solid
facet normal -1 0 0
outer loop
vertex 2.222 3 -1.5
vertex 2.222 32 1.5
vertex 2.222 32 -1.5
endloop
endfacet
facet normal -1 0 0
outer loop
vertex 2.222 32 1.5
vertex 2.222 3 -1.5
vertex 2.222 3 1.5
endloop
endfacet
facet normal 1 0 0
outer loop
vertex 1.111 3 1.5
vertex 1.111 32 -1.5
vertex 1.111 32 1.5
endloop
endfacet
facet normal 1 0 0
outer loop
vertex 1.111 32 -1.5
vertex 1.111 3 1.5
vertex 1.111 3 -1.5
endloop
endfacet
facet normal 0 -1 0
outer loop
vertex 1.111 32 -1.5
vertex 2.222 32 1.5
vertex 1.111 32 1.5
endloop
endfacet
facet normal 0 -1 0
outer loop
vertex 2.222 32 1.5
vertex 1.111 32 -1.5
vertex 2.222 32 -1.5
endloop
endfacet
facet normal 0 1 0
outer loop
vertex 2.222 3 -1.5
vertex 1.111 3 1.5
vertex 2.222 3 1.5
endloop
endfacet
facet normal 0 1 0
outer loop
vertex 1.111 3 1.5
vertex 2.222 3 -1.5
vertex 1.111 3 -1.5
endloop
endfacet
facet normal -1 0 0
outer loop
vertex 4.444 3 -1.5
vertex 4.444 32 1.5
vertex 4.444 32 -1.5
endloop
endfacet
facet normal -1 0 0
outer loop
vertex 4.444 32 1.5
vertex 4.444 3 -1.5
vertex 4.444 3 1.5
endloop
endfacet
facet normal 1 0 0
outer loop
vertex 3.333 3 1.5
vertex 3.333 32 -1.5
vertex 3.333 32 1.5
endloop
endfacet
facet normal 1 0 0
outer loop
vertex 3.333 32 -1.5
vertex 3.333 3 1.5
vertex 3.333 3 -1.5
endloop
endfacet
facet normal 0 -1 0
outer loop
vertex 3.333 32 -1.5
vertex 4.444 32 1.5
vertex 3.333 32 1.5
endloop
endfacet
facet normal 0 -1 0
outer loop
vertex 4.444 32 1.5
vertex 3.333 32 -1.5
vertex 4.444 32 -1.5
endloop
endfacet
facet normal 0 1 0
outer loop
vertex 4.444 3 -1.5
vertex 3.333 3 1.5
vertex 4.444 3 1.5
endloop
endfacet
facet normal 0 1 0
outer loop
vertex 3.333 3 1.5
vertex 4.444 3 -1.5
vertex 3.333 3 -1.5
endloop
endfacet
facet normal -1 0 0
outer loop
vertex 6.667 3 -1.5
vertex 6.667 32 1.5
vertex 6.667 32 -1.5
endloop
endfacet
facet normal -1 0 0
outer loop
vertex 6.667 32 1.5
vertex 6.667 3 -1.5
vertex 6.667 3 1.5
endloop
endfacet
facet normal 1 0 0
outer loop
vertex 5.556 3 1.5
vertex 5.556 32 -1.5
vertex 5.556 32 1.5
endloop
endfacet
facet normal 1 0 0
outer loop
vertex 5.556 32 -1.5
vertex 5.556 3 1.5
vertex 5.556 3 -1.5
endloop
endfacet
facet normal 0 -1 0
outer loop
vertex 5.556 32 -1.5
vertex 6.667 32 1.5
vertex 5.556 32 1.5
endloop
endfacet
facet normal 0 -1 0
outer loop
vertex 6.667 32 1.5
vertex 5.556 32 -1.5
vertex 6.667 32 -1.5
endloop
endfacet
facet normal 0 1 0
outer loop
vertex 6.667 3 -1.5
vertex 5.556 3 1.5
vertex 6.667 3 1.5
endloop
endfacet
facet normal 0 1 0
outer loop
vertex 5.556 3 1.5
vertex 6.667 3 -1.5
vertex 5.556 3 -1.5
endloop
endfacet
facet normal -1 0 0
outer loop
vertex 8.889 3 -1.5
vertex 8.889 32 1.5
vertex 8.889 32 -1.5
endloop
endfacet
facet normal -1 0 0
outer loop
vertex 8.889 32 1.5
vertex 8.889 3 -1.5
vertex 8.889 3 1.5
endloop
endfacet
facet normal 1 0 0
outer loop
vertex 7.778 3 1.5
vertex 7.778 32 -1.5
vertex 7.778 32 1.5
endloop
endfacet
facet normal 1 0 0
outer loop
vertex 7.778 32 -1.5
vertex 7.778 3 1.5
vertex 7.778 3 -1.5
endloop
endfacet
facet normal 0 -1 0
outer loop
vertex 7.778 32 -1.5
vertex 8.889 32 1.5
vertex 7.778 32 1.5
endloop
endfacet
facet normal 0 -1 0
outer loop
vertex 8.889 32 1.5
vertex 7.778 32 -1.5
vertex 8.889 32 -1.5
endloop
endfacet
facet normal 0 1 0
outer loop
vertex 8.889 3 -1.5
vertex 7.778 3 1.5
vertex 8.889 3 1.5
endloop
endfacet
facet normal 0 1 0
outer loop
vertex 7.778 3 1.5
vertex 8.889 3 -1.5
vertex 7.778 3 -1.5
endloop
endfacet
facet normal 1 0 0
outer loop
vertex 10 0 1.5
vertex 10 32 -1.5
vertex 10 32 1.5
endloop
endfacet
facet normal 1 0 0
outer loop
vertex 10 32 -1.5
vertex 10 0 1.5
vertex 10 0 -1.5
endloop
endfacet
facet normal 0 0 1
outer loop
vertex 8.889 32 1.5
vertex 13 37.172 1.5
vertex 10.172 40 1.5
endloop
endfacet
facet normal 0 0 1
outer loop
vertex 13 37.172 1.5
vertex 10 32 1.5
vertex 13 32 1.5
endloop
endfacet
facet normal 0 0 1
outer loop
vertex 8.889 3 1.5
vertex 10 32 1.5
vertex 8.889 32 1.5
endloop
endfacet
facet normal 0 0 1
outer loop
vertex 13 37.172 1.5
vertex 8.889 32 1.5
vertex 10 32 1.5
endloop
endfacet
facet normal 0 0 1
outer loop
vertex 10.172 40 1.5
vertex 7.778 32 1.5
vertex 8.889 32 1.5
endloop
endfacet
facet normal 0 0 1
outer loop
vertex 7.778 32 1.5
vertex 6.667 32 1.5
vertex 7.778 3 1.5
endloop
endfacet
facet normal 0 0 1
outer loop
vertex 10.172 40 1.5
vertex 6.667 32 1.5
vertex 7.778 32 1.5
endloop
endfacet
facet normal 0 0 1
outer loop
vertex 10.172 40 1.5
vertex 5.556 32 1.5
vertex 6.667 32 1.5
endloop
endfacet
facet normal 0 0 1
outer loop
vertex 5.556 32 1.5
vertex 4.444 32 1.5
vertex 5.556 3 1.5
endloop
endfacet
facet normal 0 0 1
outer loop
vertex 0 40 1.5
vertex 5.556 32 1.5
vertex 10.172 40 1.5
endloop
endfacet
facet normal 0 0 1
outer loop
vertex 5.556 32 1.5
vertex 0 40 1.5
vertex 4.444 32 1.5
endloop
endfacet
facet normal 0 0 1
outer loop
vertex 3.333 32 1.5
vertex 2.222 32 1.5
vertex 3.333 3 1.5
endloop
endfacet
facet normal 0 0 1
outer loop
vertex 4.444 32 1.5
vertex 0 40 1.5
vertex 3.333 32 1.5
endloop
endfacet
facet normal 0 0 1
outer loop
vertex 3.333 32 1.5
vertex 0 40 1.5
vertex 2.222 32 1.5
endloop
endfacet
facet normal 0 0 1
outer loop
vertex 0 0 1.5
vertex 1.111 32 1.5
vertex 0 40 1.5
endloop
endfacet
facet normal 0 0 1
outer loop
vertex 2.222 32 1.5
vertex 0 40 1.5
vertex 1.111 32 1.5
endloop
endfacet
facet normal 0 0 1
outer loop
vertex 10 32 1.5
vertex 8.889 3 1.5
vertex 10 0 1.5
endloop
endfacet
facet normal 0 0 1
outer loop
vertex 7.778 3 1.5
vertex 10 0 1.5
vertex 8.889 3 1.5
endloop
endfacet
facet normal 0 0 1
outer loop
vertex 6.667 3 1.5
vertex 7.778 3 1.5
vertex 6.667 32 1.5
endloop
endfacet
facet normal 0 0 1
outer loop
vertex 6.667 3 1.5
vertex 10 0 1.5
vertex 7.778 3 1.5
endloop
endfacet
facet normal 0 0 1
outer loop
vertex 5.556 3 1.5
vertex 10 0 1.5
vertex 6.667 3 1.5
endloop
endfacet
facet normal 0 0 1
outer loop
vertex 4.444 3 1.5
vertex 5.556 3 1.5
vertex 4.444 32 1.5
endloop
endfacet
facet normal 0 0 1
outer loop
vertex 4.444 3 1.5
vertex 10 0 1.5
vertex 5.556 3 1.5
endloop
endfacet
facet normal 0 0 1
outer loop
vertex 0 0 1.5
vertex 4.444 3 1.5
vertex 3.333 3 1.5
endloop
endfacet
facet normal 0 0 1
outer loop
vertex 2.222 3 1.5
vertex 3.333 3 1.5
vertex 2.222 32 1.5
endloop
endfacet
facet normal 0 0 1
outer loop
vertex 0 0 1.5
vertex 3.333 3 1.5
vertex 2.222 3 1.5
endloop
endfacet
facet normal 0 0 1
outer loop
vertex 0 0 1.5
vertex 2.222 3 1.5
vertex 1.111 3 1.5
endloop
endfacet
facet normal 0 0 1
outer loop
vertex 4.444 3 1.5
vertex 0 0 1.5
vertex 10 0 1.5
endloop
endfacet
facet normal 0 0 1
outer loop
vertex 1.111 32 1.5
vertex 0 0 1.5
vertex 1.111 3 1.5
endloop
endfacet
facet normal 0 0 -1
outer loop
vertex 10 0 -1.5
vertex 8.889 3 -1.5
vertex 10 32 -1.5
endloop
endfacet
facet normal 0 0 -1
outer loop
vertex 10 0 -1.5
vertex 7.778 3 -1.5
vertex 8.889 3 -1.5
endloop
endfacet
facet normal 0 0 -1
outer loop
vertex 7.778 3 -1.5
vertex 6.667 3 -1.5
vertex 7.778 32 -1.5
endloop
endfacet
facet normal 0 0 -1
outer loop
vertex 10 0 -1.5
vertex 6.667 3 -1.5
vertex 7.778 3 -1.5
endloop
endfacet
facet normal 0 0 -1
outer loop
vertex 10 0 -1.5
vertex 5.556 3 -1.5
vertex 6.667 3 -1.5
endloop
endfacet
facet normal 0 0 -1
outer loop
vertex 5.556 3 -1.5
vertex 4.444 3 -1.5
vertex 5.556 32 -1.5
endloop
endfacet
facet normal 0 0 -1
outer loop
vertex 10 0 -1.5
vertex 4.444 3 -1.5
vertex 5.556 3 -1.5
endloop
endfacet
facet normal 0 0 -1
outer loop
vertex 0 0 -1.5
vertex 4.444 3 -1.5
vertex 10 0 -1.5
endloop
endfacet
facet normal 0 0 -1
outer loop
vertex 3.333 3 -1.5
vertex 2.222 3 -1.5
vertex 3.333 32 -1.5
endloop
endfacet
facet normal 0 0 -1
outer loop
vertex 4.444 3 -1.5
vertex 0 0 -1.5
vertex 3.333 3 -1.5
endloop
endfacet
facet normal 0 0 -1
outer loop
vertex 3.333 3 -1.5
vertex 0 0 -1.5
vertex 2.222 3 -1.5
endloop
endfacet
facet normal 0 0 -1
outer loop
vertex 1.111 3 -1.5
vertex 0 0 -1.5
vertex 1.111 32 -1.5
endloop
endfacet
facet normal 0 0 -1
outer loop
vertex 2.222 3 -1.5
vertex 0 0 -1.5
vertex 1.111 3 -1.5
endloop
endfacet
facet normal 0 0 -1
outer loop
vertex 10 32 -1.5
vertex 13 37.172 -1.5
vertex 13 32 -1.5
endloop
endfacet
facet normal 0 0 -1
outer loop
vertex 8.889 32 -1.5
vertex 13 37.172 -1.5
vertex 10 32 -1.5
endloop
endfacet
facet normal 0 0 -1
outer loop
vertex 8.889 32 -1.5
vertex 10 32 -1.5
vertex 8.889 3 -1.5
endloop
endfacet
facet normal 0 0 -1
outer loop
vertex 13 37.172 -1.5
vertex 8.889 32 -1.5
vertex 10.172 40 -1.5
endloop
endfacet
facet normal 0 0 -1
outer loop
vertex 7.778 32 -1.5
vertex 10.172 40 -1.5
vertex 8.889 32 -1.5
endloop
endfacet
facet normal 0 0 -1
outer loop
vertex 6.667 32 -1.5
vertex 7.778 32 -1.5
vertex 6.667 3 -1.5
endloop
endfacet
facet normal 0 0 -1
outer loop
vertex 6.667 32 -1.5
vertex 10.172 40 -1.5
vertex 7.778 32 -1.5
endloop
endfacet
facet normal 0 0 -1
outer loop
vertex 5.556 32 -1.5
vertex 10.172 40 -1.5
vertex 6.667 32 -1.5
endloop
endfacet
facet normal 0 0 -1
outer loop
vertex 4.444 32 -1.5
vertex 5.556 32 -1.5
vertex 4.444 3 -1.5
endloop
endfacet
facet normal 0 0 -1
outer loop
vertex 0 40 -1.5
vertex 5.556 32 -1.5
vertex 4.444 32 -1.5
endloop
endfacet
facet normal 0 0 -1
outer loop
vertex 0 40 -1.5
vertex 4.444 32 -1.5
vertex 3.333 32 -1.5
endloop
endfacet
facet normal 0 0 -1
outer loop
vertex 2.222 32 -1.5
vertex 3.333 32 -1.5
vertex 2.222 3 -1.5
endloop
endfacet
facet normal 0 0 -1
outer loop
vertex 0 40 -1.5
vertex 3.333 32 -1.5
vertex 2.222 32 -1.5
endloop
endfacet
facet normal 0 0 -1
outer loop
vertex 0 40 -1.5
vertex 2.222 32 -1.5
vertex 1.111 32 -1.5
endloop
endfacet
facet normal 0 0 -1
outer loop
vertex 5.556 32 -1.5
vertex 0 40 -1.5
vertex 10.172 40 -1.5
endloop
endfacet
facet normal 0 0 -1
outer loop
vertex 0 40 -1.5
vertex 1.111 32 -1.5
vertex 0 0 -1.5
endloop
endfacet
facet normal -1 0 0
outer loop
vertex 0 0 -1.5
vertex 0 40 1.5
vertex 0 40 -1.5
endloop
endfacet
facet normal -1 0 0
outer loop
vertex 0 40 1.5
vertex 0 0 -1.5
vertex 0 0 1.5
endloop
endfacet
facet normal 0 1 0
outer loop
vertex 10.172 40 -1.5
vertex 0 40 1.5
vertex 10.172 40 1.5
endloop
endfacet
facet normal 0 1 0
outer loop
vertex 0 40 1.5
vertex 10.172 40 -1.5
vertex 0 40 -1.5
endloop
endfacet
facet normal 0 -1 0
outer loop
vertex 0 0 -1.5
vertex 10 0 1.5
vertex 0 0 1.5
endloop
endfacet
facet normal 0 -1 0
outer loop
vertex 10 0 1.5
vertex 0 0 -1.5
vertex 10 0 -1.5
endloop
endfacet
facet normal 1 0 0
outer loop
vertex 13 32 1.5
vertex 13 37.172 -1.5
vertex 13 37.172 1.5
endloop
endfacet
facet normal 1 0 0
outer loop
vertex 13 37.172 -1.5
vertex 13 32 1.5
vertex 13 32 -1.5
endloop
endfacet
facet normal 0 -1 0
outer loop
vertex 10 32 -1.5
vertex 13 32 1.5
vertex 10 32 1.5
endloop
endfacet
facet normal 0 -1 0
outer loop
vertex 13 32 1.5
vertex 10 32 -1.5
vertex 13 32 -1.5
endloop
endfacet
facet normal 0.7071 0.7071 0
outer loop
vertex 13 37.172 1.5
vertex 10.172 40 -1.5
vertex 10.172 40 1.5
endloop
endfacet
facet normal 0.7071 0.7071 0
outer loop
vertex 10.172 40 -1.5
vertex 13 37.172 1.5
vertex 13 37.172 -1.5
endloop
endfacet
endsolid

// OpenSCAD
material_z = 3;
nothing = 0.01;

module snap_feather(
            width,
            height,
            hook_width,
            hook_height,
            hook_cutaway,
            leg_width,
            leg_count,
            leg_offset
            )
{
    // feather leg(s)
    difference()
    {
        translate([
            width/2,
            height/2,
            0
            ])
        cube([
            width,
            height,
            material_z
            ], center=true);
        
        leg_width = width/(2*leg_count-1);
        leg_height = height - hook_height - leg_offset;
        for (i=[1:leg_count-1])
        {
            translate([
                leg_width/2 + (i*2-1)*leg_width,
                leg_height/2 + leg_offset,
                0
                ])
            cube([
                leg_width,
                leg_height,
                material_z + 2*nothing
                ], center=true);
        }
    }

    // feather head
    translate([
        width + hook_width/2,
        height - hook_height/2,
        0
        ])
    difference()
    {
        cube([
            hook_width,
            hook_height,
            material_z
            ], center=true);
        
        // cut away a corner
        translate([
            hook_width/2,
            hook_height/2,
            0
            ])
        rotate(45)
        cube([
            hook_cutaway,
            hook_cutaway,
            material_z + 2*nothing
            ], center=true);
    }
}

snap_feather(
    width=10,
    height=40,
    hook_width=3,
    hook_height=8,
    hook_cutaway=4,
    leg_width=2,
    leg_count=5,
    leg_offset=3
    );
